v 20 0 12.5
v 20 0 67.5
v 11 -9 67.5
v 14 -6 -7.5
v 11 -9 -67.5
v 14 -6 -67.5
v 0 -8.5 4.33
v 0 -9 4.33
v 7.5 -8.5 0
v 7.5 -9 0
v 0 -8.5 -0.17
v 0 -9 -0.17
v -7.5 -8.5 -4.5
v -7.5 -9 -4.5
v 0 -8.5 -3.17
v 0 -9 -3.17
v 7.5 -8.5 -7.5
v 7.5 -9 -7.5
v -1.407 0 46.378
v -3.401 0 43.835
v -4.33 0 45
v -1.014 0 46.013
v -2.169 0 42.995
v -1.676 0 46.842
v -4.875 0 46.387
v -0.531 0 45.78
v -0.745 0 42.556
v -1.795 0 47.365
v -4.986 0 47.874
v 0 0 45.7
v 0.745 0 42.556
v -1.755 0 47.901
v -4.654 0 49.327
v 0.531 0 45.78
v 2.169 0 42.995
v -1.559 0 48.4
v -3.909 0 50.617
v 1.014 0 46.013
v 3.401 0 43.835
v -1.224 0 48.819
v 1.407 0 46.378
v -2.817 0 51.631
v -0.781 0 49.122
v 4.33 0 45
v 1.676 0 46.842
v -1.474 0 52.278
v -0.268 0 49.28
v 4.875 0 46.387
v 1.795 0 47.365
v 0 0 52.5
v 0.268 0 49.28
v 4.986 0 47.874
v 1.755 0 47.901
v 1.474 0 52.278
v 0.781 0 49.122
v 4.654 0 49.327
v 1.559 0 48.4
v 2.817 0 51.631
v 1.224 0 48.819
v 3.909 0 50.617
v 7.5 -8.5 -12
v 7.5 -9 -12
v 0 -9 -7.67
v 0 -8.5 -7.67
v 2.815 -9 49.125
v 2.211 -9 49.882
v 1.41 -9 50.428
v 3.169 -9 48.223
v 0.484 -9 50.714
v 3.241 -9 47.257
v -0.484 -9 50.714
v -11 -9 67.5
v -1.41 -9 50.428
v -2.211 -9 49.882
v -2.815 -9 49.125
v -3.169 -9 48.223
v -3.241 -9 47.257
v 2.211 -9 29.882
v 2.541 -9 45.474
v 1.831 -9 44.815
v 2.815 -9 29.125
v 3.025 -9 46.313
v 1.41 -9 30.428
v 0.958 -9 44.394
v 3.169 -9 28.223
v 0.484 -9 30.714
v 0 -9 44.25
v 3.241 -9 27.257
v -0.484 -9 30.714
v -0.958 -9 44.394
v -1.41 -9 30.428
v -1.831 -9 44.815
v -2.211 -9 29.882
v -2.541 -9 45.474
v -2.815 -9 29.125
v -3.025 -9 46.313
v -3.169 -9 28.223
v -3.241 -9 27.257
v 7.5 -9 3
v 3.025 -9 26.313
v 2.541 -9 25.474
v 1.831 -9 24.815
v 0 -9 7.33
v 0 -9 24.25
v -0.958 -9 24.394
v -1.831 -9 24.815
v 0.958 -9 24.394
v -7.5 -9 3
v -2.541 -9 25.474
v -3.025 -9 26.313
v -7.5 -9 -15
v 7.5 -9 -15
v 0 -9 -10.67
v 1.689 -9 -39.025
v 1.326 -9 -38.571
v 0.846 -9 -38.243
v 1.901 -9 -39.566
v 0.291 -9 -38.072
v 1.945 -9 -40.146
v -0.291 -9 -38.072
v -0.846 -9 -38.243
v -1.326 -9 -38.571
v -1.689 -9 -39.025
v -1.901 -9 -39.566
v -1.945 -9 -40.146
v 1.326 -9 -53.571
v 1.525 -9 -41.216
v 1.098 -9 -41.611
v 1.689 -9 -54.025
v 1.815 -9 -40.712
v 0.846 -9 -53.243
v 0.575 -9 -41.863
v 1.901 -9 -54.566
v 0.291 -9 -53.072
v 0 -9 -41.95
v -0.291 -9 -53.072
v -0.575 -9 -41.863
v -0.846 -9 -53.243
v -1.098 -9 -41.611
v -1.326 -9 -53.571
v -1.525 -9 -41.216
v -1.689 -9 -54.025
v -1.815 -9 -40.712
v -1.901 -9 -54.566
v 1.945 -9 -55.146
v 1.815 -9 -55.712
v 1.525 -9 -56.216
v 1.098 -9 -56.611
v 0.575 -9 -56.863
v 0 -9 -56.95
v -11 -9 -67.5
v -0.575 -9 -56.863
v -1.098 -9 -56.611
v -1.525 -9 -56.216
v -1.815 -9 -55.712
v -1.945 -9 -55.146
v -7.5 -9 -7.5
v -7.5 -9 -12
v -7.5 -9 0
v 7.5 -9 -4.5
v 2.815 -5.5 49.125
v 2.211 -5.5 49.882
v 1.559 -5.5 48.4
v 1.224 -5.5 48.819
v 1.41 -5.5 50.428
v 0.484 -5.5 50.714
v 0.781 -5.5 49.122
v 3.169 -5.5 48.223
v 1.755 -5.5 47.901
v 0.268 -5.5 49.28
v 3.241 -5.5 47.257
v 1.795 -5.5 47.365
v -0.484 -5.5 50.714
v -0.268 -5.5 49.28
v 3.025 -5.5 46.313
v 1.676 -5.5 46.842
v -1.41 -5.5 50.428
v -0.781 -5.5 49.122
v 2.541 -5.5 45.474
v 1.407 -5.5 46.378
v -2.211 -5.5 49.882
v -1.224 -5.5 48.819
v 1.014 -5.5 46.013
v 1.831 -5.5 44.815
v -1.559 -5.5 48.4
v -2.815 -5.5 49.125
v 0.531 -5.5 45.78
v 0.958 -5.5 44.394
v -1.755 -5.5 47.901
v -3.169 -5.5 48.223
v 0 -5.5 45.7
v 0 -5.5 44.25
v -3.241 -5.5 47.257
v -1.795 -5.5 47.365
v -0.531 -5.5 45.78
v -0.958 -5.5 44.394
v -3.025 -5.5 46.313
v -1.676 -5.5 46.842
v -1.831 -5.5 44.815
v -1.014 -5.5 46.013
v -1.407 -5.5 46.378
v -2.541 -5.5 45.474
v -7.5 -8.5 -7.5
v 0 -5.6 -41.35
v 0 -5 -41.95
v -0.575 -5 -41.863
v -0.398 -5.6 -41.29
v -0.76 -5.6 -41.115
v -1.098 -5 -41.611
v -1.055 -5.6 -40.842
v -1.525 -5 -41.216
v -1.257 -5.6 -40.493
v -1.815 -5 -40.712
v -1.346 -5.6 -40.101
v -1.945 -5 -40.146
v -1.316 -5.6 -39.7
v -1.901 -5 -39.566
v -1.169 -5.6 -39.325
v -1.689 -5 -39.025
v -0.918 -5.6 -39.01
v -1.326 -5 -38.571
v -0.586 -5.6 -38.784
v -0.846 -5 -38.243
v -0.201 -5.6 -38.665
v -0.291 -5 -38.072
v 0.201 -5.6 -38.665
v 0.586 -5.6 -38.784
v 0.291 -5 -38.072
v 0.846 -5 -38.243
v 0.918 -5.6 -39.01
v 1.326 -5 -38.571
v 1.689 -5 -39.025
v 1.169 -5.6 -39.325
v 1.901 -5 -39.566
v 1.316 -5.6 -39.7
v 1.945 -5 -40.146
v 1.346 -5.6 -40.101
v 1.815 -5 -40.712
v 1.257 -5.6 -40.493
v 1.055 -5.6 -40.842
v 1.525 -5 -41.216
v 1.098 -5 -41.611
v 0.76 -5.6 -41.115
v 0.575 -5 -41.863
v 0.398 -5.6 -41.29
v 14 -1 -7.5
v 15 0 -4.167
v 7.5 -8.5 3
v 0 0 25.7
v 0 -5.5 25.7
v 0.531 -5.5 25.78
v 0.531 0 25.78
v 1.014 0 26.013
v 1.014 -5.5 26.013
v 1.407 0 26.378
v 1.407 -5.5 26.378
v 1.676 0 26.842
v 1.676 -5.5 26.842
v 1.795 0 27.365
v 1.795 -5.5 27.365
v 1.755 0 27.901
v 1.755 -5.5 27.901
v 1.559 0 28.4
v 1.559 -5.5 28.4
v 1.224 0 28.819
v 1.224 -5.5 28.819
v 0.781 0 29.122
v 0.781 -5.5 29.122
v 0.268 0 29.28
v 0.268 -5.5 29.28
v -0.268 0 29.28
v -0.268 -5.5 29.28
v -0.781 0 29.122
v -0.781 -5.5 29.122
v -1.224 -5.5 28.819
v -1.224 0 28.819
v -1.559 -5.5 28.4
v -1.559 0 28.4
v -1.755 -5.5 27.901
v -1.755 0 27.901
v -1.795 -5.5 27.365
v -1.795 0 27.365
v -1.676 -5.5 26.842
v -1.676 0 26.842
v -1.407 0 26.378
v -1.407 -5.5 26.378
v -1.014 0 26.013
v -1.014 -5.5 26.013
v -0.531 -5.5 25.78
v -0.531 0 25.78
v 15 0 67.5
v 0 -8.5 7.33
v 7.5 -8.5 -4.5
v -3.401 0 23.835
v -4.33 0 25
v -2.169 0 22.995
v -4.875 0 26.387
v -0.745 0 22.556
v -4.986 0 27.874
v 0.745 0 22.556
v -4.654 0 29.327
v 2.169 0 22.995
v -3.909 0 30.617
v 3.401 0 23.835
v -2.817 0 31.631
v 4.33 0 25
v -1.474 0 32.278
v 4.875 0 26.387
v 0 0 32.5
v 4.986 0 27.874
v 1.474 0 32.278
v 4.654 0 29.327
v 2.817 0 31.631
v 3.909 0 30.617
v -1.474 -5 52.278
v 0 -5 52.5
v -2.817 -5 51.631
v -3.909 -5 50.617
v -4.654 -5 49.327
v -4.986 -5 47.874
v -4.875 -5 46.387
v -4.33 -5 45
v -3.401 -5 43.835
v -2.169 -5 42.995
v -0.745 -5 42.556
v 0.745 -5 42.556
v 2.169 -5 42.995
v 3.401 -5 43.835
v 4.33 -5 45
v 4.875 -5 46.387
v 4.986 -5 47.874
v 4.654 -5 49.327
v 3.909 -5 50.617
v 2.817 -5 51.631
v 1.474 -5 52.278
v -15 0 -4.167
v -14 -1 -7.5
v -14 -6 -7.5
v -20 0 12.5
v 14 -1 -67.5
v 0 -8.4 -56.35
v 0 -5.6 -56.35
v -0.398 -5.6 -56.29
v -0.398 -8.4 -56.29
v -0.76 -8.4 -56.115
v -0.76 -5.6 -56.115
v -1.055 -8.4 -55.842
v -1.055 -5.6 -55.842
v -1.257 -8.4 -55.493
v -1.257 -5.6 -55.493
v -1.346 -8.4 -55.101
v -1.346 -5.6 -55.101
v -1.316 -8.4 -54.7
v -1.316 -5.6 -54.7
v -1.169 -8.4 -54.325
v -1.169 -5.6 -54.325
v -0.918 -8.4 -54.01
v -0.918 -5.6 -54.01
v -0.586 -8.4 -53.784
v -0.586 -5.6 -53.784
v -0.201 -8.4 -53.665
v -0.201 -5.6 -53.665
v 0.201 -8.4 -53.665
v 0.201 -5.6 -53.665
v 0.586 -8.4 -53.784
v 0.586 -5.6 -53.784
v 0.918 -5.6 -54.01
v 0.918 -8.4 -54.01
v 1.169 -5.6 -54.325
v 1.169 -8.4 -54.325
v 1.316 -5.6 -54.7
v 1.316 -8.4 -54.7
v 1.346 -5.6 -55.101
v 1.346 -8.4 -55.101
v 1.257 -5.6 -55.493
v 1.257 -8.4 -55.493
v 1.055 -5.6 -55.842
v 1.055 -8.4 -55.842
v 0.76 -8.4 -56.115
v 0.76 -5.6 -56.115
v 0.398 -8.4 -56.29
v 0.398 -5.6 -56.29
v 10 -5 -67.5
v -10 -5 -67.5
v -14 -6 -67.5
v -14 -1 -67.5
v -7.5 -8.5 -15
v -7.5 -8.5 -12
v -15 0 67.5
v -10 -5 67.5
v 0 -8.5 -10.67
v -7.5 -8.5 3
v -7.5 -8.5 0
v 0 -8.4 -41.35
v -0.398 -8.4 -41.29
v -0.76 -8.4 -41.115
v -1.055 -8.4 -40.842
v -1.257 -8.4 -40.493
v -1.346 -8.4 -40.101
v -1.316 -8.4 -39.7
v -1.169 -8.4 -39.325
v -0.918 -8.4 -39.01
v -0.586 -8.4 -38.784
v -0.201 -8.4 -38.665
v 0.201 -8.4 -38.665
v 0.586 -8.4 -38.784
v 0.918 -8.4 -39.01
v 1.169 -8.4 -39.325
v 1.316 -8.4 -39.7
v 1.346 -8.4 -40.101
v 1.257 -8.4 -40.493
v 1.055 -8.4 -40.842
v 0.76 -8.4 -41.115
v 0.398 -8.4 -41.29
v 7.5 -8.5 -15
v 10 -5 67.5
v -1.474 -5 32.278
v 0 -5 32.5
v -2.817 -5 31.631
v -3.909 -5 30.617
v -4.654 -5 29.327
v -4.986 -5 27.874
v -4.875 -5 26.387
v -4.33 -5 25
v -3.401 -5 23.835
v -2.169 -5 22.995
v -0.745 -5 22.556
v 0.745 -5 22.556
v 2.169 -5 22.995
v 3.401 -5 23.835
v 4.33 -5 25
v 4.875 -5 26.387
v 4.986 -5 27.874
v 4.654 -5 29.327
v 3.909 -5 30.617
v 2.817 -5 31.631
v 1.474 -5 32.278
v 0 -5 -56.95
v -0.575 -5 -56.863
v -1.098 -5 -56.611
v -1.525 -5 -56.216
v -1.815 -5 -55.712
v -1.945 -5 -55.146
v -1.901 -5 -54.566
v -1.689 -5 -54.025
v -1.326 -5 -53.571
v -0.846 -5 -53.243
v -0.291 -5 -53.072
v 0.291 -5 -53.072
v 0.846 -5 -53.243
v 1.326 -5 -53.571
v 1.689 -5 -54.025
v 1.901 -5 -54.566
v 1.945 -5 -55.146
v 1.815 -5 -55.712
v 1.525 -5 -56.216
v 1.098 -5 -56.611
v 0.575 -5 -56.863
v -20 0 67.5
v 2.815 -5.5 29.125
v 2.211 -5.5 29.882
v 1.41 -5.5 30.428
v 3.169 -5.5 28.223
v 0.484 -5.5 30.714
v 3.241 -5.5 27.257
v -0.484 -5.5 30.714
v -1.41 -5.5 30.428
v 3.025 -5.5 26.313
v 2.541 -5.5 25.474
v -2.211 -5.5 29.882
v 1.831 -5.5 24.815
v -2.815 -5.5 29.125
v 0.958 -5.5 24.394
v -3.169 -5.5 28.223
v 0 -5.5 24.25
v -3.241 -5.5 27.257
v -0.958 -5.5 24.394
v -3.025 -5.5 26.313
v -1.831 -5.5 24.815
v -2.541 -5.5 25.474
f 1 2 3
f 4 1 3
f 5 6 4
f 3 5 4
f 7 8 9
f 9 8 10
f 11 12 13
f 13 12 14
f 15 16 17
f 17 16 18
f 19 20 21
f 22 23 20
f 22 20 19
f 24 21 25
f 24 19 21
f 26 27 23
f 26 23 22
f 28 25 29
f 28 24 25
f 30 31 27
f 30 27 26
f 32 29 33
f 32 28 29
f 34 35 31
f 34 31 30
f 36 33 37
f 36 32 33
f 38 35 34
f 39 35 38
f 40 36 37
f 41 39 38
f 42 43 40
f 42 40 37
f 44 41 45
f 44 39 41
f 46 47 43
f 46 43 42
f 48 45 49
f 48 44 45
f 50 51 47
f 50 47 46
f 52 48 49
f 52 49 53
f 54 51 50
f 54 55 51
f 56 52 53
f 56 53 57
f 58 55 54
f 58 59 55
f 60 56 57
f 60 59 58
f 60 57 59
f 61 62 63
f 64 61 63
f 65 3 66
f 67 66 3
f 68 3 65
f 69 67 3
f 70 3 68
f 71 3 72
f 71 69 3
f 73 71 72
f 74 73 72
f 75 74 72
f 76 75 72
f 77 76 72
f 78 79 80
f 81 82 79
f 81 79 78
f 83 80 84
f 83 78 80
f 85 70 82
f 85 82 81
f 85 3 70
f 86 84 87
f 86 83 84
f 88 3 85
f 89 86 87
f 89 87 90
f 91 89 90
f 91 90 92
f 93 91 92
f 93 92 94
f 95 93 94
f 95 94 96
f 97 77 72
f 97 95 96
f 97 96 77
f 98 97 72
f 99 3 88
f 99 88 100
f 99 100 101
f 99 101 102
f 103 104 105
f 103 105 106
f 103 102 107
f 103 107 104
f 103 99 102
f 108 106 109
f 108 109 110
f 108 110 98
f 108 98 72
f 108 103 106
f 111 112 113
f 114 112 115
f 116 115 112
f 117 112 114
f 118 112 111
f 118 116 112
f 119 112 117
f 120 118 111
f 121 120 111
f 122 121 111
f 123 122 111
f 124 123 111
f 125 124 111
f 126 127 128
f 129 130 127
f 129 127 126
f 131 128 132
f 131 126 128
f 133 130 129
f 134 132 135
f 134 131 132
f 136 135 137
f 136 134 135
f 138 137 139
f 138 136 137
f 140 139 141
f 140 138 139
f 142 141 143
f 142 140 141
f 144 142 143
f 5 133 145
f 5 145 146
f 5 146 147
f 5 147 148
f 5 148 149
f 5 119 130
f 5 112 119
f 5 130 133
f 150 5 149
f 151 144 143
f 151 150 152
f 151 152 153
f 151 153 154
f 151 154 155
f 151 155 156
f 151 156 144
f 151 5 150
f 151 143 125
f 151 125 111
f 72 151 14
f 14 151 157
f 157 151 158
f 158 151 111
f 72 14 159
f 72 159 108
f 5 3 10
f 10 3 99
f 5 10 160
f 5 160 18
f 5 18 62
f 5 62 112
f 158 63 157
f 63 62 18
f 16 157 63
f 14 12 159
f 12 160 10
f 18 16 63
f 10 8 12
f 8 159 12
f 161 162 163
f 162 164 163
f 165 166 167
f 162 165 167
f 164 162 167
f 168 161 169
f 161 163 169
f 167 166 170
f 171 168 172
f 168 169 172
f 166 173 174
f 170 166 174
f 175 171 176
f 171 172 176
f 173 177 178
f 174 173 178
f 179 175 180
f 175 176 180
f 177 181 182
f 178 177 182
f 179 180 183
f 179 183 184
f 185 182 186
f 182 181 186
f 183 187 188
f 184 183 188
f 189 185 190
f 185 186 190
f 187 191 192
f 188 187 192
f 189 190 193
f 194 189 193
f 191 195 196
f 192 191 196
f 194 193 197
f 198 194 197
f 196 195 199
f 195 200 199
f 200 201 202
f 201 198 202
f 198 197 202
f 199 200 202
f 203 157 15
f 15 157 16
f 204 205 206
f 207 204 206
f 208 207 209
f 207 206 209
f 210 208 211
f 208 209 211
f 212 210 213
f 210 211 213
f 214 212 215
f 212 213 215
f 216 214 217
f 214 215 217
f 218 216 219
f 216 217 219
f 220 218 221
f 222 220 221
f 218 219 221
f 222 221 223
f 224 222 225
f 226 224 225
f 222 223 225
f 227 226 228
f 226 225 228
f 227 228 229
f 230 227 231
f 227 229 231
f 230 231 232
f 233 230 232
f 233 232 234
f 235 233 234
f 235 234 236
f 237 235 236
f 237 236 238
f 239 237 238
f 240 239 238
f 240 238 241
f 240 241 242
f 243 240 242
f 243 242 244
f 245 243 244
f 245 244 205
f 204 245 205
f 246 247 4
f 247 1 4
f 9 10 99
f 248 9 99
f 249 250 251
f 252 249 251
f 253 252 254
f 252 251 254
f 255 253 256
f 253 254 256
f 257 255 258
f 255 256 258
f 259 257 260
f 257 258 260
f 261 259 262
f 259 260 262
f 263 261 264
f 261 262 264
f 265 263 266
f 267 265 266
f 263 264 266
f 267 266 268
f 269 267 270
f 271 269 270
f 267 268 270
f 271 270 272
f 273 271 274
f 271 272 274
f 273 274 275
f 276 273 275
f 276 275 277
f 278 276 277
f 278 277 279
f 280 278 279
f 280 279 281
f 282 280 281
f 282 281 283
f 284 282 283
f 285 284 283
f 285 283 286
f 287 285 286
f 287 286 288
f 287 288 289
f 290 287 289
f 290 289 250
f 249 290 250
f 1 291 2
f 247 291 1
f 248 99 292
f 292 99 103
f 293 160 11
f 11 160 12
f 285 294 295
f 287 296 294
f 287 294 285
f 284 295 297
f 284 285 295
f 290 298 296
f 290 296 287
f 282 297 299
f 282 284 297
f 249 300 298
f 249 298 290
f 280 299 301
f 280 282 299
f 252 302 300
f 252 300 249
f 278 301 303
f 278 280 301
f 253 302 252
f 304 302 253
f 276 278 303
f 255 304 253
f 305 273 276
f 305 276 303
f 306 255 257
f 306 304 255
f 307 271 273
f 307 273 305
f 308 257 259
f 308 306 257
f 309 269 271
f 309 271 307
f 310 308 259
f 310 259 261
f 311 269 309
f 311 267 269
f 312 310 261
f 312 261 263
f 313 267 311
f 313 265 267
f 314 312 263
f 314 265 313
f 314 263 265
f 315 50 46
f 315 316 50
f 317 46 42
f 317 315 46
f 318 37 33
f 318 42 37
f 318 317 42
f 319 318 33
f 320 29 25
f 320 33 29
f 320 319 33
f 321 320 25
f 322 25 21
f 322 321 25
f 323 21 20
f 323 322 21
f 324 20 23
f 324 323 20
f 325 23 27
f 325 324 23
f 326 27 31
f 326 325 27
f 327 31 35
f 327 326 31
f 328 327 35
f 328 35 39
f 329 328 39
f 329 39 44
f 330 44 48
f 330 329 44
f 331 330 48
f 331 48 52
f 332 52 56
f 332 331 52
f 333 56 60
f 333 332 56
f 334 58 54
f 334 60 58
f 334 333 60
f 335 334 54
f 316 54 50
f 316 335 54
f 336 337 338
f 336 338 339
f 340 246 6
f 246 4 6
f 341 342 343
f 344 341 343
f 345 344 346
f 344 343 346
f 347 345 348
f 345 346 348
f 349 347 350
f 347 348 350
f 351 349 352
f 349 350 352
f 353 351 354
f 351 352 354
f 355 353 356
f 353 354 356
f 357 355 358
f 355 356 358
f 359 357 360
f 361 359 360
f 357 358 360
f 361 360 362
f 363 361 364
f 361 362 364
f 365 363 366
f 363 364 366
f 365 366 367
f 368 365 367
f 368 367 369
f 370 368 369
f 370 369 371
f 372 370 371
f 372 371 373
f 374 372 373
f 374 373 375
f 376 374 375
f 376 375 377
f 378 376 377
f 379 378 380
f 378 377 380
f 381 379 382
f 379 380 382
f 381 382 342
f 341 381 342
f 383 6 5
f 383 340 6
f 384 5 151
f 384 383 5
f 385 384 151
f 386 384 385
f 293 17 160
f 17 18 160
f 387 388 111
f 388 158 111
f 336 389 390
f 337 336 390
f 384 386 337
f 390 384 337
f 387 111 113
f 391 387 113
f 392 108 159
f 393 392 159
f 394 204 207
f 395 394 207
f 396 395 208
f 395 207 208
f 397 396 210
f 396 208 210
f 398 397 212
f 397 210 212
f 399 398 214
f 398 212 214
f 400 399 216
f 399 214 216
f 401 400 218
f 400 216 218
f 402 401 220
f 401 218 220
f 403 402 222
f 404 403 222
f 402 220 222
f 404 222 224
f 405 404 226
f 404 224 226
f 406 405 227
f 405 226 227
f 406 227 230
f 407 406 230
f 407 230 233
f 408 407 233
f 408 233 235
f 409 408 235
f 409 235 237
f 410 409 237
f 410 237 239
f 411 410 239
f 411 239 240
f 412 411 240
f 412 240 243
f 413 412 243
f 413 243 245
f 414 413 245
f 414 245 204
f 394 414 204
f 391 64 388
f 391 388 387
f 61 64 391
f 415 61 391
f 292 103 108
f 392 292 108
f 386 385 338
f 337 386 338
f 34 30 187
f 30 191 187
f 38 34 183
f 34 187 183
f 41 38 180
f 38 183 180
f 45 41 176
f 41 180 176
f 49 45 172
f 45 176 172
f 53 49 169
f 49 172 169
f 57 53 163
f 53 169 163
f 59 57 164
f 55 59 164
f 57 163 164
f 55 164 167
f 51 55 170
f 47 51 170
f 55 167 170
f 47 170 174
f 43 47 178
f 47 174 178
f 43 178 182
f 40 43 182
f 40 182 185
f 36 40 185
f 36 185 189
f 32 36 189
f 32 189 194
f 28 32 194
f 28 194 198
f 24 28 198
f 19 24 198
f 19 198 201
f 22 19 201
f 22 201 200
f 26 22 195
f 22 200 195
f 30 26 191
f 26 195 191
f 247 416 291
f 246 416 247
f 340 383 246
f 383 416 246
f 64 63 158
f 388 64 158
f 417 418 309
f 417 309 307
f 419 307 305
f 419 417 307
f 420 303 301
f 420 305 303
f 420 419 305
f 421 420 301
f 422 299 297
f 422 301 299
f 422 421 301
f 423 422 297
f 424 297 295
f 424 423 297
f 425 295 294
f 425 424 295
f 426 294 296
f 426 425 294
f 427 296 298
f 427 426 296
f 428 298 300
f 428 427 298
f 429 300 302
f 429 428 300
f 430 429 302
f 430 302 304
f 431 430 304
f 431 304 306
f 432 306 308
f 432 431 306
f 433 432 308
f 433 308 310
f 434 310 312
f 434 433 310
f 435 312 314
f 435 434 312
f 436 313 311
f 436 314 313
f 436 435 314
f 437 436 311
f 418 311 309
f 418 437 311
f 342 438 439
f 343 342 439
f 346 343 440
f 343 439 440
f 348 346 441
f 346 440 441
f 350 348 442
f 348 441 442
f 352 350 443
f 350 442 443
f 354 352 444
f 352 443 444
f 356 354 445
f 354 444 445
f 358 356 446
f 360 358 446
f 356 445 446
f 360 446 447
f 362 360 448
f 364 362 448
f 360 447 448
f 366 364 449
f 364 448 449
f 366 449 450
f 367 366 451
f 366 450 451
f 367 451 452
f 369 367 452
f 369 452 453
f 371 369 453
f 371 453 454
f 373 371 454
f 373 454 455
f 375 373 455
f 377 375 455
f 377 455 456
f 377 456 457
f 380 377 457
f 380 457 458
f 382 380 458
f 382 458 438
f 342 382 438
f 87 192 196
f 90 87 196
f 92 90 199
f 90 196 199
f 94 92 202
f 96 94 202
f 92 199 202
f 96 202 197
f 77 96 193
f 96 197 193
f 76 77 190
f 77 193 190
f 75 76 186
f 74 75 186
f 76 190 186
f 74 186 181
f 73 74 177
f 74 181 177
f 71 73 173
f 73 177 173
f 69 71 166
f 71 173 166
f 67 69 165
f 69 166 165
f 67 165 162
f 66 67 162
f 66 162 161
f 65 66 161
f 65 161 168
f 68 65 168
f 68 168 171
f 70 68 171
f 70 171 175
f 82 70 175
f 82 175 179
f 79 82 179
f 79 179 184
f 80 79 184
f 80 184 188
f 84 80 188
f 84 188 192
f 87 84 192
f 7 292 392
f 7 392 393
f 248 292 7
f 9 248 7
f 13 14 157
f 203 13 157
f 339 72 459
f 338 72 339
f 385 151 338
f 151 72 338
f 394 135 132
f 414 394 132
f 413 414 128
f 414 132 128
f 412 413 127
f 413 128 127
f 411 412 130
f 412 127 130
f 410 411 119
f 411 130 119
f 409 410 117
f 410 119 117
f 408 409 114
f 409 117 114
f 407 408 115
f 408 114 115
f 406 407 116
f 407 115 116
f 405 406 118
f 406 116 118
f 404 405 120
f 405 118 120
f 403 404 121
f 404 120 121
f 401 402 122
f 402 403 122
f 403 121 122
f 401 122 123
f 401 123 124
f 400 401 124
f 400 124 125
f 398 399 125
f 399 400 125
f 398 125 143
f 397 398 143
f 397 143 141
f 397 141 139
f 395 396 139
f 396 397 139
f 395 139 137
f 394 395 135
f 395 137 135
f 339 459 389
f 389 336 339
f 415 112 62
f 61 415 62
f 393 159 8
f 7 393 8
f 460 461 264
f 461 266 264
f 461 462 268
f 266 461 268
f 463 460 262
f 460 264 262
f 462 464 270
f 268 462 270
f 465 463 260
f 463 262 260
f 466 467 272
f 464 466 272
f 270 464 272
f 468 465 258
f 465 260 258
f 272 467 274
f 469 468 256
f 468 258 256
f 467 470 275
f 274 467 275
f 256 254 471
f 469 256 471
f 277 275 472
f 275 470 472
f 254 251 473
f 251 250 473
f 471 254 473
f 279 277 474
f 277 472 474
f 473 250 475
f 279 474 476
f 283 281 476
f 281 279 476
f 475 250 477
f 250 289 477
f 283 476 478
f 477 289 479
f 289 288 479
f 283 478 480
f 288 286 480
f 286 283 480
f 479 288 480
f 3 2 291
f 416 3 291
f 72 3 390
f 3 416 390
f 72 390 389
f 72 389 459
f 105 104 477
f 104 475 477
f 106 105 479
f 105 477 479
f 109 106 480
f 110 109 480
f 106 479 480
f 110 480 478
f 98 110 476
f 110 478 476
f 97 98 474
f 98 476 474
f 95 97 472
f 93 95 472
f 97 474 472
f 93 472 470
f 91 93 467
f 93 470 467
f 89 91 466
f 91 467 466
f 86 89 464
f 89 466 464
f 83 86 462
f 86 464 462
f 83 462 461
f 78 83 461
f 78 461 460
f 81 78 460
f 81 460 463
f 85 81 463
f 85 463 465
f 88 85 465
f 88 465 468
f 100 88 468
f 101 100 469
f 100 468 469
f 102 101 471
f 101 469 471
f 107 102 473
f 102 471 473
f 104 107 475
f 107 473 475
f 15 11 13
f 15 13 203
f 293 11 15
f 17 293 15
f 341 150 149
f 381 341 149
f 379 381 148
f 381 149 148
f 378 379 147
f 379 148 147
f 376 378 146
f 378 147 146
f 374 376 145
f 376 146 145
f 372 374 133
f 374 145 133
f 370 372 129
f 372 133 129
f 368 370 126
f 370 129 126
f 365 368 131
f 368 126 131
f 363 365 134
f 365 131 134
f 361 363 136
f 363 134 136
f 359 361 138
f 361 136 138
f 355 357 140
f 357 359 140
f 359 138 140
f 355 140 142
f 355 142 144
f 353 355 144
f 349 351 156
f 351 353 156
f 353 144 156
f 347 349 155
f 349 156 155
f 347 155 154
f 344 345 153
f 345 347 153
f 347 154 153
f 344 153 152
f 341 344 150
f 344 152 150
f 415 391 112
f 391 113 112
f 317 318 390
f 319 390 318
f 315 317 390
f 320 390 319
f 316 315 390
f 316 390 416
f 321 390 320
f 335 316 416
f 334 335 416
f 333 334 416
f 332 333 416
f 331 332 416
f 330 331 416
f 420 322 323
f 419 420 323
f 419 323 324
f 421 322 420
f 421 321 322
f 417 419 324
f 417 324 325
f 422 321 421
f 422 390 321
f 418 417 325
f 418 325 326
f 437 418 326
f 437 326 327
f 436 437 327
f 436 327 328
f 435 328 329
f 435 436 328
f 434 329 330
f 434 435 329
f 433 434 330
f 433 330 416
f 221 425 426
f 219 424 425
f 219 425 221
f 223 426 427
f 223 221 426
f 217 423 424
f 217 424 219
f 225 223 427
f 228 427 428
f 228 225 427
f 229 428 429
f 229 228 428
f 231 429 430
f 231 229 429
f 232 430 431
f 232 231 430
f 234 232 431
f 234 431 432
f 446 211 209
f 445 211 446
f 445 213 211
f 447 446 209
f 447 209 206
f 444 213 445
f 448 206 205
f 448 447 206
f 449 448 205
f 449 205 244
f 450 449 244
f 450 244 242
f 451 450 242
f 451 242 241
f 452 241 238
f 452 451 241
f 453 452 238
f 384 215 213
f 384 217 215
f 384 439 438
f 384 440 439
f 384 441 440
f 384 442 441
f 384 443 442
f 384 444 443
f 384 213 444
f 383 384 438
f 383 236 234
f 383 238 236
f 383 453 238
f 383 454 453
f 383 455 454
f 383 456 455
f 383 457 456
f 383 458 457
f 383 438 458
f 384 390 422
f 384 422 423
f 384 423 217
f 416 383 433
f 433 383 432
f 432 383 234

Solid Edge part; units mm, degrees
sketch "Sketch1" plane through (0, 0, 0) normal (0, 0, 1) x (1, 0, 0)
  line L0 (-20, 0) -> (-15, 0)
  line L1 (-15, 0) -> (-10, -5)
  line L2 (-10, -5) -> (10, -5)
  line L3 (10, -5) -> (15, 0)
  line L4 (15, 0) -> (20, 0)
  line L5 (20, 0) -> (11, -9)
  line L6 (11, -9) -> (-11, -9)
  line L7 (-11, -9) -> (-20, 0)
  dimension "D1" = 40
  dimension "D2" = 5
  dimension "D3" = 9
  dimension "D4" = 5
extrude "body_Profile_Plane1" add sketch "Sketch1" along normal mid plane 135
sketch "Sketch2" plane through (0, -5, 0) normal (0, 1, 0) x (0, 0, 1)
  circle A0 centre (27.5, 0) radius 5
  circle A1 centre (47.5, 0) radius 5
  dimension "D1" = 20
  dimension "D2" = 37.5
  dimension "D3" = 10
extrude "Protrusion1" add sketch "Sketch2" along normal up to vertex (5 mm away)
hole "Hole1" at (0, -9, 47.5) direction (0, 1, 0) diameter 3.6 end up to next counterbore diameter 6.5 counterbore depth 3.5
hole "Hole2" at (0, -9, 27.5) direction (0, 1, 0) diameter 3.6 end up to next counterbore diameter 6.5 counterbore depth 3.5
sketch "Sketch3" plane through (0, -9, 0) normal (0, -1, 0) x (0, 0, 1)
  line L0 (-67.5, 20) -> (-67.5, 14)
  line L1 (-67.5, 14) -> (-7.5, 14)
  line L2 (-7.5, 14) -> (12.5, 20)
  line L3 (12.5, 20) -> (-67.5, 20)
  dimension "D1" = 80
  dimension "D2" = 60
  dimension "D3" = 6
extrude "Cutout1" cut sketch "Sketch3" against normal up to vertex (9 mm away)
mirror "Mirror1" about plane through (0, 0, 0) normal (1, 0, 0) of "Cutout1"
hole "Hole3" at (0, -9, -55) direction (0, 1, 0) diameter 2.7 depth 30 tip angle 118 start chamfer 0.6 start chamfer angle 45 end chamfer 0.6 end chamfer angle 45
hole "Hole4" at (0, -9, -40) direction (0, 1, 0) diameter 2.7 depth 30 tip angle 118 start chamfer 0.6 start chamfer angle 45 end chamfer 0.6 end chamfer angle 45
sketch "Sketch4" plane through (0, -9, 0) normal (0, -1, 0) x (0, 0, 1)
  line L0 (-15, 7.5) -> (-10.6699, 0)
  line L1 (-10.6699, 0) -> (-15, -7.5)
  line L2 (-15, -7.5) -> (-12, -7.5)
  line L3 (-12, -7.5) -> (-7.6699, 0)
  line L4 (-7.6699, 0) -> (-12, 7.5)
  line L5 (-12, 7.5) -> (-15, 7.5)
  dimension "D1" = 3
  dimension "D2" = 15
  dimension "D3" = 15
extrude "design_cutout" cut sketch "Sketch4" against normal blind 0.5
pattern_linear "Pattern1" count 3 spacing 7.5 along (0, 0, 1) of "design_cutout"
properties material "Polypropylene, general purpose"
